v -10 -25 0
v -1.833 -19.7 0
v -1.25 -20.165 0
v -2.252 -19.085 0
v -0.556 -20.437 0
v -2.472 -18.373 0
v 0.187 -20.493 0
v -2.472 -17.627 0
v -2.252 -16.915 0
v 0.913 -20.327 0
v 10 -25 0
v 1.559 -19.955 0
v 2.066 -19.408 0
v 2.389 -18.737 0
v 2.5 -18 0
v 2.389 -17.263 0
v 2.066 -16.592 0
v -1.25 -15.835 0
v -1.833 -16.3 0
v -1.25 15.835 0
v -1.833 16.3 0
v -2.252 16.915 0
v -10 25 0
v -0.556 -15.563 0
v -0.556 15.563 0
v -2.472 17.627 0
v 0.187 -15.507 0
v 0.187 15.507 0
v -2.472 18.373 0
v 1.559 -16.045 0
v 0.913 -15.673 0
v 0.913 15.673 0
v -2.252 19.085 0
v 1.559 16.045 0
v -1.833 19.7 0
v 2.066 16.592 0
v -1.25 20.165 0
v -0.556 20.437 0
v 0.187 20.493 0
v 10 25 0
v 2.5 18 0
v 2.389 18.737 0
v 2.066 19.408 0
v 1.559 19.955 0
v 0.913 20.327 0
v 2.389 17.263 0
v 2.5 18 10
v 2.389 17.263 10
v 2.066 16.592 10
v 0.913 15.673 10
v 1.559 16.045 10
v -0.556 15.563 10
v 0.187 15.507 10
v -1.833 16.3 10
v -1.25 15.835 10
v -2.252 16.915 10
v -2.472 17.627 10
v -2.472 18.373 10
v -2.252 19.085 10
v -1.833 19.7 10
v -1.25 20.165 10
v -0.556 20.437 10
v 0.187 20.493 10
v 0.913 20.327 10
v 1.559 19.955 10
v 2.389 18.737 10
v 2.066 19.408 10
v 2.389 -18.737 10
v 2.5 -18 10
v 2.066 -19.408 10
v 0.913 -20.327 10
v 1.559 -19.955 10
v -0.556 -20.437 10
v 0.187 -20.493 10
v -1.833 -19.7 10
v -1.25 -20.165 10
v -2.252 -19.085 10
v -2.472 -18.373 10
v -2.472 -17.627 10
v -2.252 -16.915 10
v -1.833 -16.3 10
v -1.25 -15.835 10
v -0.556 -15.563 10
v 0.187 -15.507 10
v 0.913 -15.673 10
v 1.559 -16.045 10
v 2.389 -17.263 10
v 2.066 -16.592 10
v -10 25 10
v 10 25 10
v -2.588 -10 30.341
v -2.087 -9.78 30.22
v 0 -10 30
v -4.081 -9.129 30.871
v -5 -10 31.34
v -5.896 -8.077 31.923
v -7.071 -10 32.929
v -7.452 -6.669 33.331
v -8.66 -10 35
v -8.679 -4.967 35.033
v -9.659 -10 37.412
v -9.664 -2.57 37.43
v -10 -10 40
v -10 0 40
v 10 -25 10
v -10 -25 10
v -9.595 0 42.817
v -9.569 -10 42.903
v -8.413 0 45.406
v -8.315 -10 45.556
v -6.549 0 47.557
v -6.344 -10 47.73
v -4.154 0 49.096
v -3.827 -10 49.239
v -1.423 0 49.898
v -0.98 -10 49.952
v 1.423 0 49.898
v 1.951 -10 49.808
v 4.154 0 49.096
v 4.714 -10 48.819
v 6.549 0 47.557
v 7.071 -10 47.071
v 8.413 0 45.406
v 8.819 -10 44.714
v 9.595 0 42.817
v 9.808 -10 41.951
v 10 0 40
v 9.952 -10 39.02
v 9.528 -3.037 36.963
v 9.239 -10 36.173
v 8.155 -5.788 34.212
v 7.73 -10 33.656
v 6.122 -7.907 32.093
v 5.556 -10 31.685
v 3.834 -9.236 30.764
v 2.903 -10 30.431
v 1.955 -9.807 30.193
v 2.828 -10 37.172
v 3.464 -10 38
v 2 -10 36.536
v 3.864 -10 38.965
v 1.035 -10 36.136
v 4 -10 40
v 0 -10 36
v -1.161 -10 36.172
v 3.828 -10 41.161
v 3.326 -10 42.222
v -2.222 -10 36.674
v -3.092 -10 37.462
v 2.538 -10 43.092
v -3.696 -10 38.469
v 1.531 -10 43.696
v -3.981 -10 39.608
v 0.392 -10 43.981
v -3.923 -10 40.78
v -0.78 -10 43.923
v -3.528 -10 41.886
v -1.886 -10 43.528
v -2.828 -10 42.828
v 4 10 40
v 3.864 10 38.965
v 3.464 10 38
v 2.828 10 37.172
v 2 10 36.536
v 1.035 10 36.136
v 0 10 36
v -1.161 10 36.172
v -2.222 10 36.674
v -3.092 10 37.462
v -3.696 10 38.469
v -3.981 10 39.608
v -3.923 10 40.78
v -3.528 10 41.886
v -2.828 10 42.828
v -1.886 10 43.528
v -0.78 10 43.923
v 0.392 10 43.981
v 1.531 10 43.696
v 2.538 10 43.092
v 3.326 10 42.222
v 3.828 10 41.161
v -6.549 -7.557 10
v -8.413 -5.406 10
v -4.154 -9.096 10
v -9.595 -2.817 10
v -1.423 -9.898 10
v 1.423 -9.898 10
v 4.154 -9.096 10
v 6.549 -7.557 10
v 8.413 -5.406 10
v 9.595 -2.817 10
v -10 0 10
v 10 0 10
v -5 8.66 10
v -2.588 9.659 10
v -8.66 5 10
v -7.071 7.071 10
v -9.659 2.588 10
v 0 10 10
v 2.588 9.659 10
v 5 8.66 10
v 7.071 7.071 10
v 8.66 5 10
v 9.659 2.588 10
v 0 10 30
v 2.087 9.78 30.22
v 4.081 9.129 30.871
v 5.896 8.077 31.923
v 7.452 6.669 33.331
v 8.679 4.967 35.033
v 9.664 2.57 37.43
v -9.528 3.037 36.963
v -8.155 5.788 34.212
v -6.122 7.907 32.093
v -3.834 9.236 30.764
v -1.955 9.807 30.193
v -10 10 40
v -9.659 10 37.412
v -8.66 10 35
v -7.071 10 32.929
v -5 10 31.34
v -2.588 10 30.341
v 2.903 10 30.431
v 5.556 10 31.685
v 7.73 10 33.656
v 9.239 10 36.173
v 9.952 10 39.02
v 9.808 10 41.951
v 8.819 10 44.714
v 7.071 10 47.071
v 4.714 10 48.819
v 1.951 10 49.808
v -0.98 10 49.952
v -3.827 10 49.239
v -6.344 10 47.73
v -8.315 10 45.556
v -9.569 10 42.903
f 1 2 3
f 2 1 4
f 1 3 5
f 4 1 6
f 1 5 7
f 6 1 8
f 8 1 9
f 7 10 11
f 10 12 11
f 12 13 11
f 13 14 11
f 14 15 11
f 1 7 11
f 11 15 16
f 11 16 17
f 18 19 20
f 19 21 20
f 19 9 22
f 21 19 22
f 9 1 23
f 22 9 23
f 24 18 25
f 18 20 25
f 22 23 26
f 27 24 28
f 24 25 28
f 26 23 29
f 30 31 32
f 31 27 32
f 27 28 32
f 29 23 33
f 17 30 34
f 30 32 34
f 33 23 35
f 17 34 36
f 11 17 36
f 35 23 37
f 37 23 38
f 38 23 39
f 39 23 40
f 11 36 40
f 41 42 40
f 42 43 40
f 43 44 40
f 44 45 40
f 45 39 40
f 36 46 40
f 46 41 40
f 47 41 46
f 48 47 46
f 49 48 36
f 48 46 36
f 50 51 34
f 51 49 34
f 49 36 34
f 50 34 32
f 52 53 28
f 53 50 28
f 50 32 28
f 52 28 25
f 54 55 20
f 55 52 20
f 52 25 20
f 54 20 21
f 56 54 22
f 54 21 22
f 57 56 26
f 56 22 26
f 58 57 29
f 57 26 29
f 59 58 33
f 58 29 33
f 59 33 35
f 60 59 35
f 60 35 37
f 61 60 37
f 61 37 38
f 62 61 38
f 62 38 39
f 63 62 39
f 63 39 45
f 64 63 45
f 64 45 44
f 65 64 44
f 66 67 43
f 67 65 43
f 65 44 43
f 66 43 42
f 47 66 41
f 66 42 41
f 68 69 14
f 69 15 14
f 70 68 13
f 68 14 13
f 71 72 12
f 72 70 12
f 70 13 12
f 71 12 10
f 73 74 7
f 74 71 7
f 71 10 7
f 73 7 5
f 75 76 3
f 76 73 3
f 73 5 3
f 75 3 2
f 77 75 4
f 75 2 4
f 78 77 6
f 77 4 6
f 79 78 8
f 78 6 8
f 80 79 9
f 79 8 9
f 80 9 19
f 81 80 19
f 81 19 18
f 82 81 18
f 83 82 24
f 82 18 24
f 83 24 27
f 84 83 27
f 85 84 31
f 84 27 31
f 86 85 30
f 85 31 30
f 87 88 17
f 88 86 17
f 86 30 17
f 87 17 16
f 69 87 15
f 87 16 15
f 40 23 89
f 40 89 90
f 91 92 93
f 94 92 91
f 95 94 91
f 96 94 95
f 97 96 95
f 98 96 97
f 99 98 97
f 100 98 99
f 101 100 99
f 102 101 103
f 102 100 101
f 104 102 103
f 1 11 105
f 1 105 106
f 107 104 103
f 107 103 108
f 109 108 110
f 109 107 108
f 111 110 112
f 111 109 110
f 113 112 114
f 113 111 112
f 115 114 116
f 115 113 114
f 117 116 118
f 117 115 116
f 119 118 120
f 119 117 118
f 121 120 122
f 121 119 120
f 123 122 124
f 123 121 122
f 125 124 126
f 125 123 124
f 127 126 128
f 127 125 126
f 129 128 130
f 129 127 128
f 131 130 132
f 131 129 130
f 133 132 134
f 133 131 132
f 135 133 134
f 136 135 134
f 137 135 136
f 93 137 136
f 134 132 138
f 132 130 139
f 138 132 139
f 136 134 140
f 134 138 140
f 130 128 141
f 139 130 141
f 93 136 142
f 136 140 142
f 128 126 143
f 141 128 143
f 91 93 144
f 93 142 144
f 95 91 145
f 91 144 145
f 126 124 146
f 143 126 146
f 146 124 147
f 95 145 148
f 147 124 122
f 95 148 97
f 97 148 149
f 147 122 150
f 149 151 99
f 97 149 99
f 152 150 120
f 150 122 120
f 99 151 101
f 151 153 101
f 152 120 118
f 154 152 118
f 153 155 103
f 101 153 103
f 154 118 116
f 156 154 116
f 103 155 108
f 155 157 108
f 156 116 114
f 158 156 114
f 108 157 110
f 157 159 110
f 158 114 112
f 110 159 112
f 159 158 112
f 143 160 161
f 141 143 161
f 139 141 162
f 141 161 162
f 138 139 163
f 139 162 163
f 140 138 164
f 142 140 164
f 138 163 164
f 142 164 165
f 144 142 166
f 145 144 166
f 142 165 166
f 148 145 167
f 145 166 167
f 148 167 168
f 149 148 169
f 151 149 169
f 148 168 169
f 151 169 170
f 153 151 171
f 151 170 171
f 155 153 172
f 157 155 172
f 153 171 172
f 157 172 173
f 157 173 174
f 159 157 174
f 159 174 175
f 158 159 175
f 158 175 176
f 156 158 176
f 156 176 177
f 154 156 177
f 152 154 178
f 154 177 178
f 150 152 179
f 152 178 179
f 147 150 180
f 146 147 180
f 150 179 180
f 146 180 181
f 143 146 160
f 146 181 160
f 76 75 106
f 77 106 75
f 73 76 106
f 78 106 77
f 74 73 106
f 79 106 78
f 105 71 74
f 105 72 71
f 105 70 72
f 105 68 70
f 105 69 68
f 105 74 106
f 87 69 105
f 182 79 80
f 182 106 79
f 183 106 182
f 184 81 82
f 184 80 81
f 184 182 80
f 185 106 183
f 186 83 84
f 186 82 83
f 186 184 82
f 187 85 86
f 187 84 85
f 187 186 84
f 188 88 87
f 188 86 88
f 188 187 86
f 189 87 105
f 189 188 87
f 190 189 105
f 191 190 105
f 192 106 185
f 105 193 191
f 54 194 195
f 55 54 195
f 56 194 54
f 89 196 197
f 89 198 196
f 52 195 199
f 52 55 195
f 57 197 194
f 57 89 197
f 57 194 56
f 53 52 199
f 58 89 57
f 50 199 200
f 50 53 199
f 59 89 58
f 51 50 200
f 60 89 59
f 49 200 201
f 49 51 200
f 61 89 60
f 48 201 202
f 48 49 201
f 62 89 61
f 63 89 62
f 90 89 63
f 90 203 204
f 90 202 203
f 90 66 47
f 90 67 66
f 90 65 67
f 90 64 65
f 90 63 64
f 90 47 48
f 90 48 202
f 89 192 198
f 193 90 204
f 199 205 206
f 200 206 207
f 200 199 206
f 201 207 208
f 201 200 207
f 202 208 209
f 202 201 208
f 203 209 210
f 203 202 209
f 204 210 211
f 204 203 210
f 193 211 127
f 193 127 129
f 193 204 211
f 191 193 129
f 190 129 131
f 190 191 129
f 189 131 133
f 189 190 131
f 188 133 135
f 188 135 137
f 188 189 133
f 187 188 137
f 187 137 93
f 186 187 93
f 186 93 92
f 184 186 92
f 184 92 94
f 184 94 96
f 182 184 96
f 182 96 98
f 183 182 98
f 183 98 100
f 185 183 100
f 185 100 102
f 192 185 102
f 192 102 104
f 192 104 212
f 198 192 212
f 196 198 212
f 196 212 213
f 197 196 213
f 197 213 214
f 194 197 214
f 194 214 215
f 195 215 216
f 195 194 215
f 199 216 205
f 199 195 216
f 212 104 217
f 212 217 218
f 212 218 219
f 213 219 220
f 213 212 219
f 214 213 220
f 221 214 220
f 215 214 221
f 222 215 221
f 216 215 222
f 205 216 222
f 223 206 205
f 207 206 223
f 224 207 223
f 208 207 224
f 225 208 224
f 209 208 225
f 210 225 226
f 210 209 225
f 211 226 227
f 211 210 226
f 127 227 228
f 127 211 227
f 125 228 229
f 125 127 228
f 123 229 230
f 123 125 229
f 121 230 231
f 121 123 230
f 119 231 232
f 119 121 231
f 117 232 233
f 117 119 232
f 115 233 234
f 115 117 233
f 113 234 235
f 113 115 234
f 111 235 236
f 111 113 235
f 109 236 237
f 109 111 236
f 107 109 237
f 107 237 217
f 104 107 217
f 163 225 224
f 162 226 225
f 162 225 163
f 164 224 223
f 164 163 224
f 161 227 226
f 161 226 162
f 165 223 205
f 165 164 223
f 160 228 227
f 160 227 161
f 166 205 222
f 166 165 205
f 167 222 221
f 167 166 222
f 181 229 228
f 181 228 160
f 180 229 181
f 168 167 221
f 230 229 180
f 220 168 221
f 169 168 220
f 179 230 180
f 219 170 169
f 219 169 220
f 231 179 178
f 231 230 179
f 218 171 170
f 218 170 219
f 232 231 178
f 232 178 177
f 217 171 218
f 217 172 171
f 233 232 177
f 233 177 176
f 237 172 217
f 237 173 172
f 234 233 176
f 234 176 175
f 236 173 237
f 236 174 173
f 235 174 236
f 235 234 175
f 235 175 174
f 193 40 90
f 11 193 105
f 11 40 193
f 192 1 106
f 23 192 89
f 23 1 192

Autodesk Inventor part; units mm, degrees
ref_plane "YZ Plane" through (0, 0, 0) normal (1, 0, 0) x (0, 1, 0)
sketch "Sketch1" plane through (0, 0, 0) normal (0, 0, 1) x (1, 0, 0)
  line L0 (-10, 25) -> (10, 25)
  line L1 (10, 25) -> (10, -25)
  line L2 (10, -25) -> (-10, -25)
  line L3 (-10, -25) -> (-10, 25)
  circle A0 centre (0, 18) radius 2.5
  circle A1 centre (0, -18) radius 2.5
  point P0 (0, 0)
  point P1 (-10, 0)
  point P2 (0, 25)
  dimension "d0" = 20
  dimension "d1" = 50
  dimension "d2" = 5
  dimension "d3" = 7
  dimension "d4" = 7
extrude "Extrusion1" add sketch "Sketch1" along normal blind 10
ref_plane "Work Plane1" through (0, -10, 0) normal (0, 1, 0) x (-1, 0, 0)
ref_plane "Work Plane2" through (10, -25, 10) normal (-0.7071, 0, 0.7071) x (0, 1, 0)
sketch "Sketch7" plane through (10, -25, 10) normal (0, 0, 1) x (0, 1, 0)
  line L0 (50, 0) -> (0, 0) projected
  circle A0 centre (25, 10) radius 10
  line L1 (50, 20) -> (0, 20) projected
  circle A1 centre (43, 10) radius 2.5 projected
  circle A2 centre (7, 10) radius 2.5 projected
  line L2 (0, 20) -> (50, 20) projected
  line L3 (50, 20) -> (50, 0) projected
  line L4 (0, 0) -> (0, 20) projected
  point P0 (25, 10)
  point P1 (25, 20)
  dimension "d28" = 20
  dimension "d29" = 10
extrude "Extrusion6" add sketch "Sketch7" along normal blind 30 contours A0
sketch "Sketch8" plane through (0, 0, 0) normal (0, 1, 0) x (-1, 0, 0)
  circle A0 centre (0, 40) radius 10
  line L0 (-10, 10) -> (-10, 40) projected
  line L1 (-10, 40) -> (10, 40) projected
  line L2 (10, 40) -> (10, 10) projected
  line L3 (10, 10) -> (10, 0) projected
  line L4 (10, 0) -> (-10, 0) projected
  line L5 (-10, 0) -> (-10, 10) projected
  point P0 (0, 0)
  point P1 (25.3553, 31.2132)
  point P2 (-10, 3.7868)
  dimension "d47" = 20
extrude "Extrusion7" add sketch "Sketch8" along normal mid plane 20 contours L1 A0 | A0 L1
sketch "Sketch9" plane through (0, 10, 40) normal (0, 1, 0) x (1, 0, 0)
  circle A0 centre (0, 0) radius 4
  circle A1 centre (0, 0) radius 10 projected
  point P0 (0, 40)
  point P1 (-3.2583, 9.4543)
  point P2 (3.2583, 9.4543)
  point P3 (-2.6421, 9.6447)
  point P4 (2.6421, 9.6447)
  point P5 (0, 10)
  point P6 (0, 10)
  dimension "d35" = 8
extrude "Extrusion8" cut sketch "Sketch9" against normal through all contours A0
equation "\"d4\" = d3"
properties part number "10-06-008"
